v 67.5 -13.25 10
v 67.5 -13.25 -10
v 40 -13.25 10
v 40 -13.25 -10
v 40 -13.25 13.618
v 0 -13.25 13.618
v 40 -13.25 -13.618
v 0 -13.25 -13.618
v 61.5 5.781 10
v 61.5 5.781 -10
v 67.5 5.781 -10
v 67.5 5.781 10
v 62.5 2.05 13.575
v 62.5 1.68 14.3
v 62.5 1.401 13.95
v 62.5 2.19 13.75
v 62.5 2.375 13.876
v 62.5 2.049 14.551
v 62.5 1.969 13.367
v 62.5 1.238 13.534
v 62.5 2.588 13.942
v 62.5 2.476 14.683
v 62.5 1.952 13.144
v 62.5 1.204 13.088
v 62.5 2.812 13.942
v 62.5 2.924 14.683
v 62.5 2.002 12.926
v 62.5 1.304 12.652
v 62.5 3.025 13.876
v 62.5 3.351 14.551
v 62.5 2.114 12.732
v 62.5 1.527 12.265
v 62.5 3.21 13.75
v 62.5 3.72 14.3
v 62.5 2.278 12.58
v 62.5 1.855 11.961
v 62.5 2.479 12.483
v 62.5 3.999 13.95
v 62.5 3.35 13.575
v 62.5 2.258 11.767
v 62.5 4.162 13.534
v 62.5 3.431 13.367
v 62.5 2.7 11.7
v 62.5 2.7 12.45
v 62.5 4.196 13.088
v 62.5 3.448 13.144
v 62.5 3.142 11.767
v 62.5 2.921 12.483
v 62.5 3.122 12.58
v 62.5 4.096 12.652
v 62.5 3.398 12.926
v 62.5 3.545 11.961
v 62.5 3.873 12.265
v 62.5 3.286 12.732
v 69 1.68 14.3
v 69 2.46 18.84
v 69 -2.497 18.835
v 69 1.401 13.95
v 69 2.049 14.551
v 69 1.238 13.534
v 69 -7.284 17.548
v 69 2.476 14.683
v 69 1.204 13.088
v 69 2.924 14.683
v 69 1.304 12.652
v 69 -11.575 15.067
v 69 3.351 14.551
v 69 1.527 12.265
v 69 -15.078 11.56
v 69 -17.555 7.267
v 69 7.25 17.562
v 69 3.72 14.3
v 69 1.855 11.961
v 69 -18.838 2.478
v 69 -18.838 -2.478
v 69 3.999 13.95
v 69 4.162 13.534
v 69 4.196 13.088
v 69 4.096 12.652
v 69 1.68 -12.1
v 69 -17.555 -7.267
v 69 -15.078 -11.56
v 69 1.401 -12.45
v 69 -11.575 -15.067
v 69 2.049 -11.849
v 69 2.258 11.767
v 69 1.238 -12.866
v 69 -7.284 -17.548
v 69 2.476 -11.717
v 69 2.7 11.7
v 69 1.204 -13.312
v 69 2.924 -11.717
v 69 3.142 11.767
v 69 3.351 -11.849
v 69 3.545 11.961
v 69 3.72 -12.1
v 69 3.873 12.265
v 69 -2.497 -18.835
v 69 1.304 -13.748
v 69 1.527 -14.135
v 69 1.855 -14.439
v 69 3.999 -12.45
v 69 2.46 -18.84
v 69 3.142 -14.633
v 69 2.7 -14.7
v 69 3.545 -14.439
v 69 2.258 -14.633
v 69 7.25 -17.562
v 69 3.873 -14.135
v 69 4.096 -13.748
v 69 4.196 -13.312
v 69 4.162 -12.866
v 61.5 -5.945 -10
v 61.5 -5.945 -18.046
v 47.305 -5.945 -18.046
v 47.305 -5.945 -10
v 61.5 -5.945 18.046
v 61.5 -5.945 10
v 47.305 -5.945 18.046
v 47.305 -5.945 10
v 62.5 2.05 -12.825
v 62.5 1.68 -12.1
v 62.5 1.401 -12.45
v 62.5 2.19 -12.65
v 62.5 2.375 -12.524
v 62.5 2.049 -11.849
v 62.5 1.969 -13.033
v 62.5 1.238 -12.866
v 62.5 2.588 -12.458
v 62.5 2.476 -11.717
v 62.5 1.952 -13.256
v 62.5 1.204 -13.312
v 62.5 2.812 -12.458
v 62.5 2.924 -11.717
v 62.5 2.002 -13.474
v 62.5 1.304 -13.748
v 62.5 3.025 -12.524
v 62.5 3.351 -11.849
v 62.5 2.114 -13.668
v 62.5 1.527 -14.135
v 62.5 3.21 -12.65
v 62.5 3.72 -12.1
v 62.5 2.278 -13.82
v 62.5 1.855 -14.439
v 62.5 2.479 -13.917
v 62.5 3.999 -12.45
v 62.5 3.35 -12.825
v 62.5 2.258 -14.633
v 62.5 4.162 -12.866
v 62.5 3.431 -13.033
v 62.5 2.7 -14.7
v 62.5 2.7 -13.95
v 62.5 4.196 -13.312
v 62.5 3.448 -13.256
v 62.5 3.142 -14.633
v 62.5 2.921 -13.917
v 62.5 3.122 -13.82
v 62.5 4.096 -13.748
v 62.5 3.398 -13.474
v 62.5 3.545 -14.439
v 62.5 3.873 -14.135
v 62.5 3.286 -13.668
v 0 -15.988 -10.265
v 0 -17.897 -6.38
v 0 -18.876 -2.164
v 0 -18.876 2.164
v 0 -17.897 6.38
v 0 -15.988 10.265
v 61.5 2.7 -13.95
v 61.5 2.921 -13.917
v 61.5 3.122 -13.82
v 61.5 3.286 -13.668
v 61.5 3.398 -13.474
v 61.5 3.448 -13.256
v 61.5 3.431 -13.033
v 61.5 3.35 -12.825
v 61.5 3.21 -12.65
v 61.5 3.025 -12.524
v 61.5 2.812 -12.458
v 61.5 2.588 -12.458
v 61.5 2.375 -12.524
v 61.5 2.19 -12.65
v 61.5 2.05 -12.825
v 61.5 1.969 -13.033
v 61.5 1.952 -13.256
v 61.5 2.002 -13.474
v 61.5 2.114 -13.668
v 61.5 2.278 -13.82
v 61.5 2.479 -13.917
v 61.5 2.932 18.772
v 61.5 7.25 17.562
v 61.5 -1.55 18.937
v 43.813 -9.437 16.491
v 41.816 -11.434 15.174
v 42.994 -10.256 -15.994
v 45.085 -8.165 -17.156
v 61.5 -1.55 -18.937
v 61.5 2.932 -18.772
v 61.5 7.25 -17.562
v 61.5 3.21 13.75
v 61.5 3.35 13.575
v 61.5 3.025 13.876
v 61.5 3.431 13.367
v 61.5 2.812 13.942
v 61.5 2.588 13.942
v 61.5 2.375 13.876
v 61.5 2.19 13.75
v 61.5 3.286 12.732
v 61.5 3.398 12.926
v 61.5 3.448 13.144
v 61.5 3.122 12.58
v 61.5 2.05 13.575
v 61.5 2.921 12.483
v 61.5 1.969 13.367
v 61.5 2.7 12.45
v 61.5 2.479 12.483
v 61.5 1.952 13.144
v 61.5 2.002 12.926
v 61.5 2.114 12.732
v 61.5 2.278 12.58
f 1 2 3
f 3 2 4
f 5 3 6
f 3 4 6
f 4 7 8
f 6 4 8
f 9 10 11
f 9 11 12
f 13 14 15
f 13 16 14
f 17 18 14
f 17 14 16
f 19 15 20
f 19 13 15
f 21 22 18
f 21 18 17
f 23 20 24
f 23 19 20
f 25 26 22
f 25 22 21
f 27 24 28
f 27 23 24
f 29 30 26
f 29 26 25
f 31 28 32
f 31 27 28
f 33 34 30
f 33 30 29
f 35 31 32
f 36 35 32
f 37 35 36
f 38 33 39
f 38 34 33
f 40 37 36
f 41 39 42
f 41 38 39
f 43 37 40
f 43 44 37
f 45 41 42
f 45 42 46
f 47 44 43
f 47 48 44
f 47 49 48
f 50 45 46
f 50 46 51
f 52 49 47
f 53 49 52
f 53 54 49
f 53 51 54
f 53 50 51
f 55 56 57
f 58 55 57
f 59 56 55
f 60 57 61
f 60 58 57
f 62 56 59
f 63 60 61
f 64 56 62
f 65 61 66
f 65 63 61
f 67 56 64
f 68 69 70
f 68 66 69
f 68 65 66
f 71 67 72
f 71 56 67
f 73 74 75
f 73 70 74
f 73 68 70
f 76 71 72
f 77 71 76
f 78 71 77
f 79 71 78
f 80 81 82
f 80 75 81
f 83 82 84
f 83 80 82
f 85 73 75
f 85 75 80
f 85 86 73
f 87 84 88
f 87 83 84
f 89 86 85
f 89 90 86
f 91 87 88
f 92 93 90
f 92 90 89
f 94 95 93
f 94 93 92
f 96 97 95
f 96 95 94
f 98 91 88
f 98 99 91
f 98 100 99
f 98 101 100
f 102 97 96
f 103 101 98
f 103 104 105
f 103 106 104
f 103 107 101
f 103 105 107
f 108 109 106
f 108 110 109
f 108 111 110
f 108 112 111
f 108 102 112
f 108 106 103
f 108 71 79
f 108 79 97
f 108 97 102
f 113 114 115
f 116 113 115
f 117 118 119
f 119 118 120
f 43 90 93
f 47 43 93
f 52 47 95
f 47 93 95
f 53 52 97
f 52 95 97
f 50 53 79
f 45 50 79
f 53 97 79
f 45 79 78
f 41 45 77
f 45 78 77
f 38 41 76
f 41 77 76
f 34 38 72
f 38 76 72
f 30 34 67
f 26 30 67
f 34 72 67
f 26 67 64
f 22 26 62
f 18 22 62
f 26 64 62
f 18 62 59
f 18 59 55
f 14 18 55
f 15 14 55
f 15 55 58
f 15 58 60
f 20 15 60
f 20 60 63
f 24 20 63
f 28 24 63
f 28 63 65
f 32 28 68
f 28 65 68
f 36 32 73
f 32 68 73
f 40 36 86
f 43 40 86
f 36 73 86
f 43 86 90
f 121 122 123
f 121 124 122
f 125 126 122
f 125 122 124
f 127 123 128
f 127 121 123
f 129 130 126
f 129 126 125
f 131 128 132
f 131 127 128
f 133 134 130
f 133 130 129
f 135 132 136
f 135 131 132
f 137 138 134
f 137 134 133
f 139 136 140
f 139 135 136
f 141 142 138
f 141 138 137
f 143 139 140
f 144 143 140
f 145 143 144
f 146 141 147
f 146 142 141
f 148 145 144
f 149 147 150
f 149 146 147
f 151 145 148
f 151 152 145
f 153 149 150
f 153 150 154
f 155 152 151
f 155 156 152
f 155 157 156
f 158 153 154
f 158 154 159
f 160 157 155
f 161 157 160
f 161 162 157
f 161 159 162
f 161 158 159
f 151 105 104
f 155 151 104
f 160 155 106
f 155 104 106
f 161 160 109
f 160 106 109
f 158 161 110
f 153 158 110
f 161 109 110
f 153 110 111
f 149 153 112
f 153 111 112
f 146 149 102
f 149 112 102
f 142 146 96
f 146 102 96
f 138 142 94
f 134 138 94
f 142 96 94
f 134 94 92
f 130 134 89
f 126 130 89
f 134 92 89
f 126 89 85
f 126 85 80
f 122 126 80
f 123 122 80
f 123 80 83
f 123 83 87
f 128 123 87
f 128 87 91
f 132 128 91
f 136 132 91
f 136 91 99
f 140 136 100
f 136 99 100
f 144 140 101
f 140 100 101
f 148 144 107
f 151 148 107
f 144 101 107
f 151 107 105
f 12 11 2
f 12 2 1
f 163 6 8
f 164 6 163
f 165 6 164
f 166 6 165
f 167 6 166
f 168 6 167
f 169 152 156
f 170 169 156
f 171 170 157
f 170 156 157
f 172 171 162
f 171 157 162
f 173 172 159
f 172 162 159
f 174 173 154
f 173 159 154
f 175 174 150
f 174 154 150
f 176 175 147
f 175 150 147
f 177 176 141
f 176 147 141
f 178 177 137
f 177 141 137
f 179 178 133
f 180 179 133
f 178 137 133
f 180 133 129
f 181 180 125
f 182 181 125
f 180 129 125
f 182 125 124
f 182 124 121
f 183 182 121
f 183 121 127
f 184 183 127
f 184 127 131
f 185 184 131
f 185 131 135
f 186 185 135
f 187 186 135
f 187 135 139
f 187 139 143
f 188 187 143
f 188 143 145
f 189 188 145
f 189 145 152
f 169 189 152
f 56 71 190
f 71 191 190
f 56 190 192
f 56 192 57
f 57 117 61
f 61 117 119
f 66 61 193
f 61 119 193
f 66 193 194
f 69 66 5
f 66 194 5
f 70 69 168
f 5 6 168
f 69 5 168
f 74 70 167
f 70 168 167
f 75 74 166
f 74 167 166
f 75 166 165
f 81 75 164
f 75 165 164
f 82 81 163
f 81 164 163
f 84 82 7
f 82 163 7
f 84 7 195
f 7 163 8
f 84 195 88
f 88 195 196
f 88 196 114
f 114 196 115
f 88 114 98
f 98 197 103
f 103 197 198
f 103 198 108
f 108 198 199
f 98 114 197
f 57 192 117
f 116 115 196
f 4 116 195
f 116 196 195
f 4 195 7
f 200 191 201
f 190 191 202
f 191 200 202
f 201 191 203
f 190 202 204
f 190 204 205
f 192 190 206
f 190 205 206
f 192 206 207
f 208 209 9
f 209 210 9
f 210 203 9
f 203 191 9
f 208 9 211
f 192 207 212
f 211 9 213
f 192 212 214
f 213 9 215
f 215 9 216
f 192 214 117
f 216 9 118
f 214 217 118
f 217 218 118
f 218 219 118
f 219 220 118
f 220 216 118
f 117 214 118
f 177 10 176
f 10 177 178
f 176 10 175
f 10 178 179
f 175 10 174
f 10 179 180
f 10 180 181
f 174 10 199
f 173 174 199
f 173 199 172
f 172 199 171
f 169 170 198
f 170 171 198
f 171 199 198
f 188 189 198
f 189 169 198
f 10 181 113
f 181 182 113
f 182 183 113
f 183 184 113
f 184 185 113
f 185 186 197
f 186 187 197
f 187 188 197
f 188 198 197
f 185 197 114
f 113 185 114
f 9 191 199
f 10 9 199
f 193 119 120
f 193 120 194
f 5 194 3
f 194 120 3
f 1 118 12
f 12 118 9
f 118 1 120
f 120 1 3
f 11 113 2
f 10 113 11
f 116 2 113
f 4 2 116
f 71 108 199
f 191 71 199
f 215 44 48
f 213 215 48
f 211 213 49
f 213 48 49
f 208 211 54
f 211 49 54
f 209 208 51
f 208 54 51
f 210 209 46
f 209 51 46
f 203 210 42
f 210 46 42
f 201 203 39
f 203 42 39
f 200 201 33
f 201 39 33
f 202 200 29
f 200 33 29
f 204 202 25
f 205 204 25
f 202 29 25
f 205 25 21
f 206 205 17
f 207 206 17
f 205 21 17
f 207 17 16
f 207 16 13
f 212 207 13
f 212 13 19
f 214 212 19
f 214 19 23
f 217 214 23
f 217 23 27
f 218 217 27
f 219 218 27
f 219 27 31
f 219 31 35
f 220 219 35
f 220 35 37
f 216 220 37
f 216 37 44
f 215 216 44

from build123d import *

# Parameters (mm, degrees)
SKETCH_1_R               = 19
EXTRUDE_1_DEPTH          = 69
CUT_EXTRUDE_1_DEPTH      = 75.047282192
CUT_EXTRUDE_1_DEPTH_BACK = 75.047282192
SKETCH_4_W               = 20
SKETCH_4_H               = 14
CUT_EXTRUDE_2_DEPTH      = 68.113709479
SKETCH_5_W               = 20
SKETCH_5_H               = 19.031424338
CUT_EXTRUDE_3_DEPTH      = 6
SKETCH_6_R               = 0.75
CUT_EXTRUDE_4_DEPTH      = 75.047282192
SKETCH_7_R               = 1.5
CUT_EXTRUDE_5_DEPTH      = 6.5


with BuildPart() as part:
    # 草图1 → 凸台-拉伸1 (new body)
    with BuildSketch(Plane(origin=(0, 0, 0), x_dir=(0, 0, -1), z_dir=(1, 0, 0))):
        Circle(SKETCH_1_R)
    extrude(amount=EXTRUDE_1_DEPTH)

    # 草图3 → 切除-拉伸1 (cut, two sides: drawn at the far end of the back side and taken through both)
    with BuildSketch(Plane.XY.offset(-CUT_EXTRUDE_1_DEPTH_BACK)):
        Polygon((69, 7.25), (61.5, 7.25), (61.5, -5.944695841), (47.305304159, -5.944695841), (40, -13.25), (0, -13.25), (0, 41.360608317), (69, 41.360608317), align=None)
    extrude(amount=CUT_EXTRUDE_1_DEPTH + CUT_EXTRUDE_1_DEPTH_BACK, mode=Mode.SUBTRACT)

    # 草图4 → 切除-拉伸2 (cut, through all)
    with BuildSketch(Plane.ZY.offset(-61.5)):
        with Locations((0, -6.25)):
            Rectangle(SKETCH_4_W, SKETCH_4_H)
    extrude(amount=CUT_EXTRUDE_2_DEPTH, mode=Mode.SUBTRACT)

    # 草图5 → 切除-拉伸3 (cut)
    with BuildSketch(Plane.ZY.offset(-61.5)):
        with Locations((0, -3.734287831)):
            Rectangle(SKETCH_5_W, SKETCH_5_H)
    extrude(amount=-CUT_EXTRUDE_3_DEPTH, mode=Mode.SUBTRACT)

    # 草图6 → 切除-拉伸4 (cut, through all)
    with BuildSketch(Plane(origin=(69, 0, 0), x_dir=(0, 0, -1), z_dir=(1, 0, 0))):
        with Locations((-13.2, 2.7)):
            Circle(SKETCH_6_R)
        with Locations((13.2, 2.7)):
            Circle(SKETCH_6_R)
    extrude(amount=-CUT_EXTRUDE_4_DEPTH, mode=Mode.SUBTRACT)

    # 草图7 → 切除-拉伸5 (cut)
    with BuildSketch(Plane(origin=(69, 0, 0), x_dir=(0, 0, -1), z_dir=(1, 0, 0))):
        with Locations((-13.2, 2.7)):
            Circle(SKETCH_7_R)
        with Locations((13.2, 2.7)):
            Circle(SKETCH_7_R)
    extrude(amount=-CUT_EXTRUDE_5_DEPTH, mode=Mode.SUBTRACT)


solid = part.part
